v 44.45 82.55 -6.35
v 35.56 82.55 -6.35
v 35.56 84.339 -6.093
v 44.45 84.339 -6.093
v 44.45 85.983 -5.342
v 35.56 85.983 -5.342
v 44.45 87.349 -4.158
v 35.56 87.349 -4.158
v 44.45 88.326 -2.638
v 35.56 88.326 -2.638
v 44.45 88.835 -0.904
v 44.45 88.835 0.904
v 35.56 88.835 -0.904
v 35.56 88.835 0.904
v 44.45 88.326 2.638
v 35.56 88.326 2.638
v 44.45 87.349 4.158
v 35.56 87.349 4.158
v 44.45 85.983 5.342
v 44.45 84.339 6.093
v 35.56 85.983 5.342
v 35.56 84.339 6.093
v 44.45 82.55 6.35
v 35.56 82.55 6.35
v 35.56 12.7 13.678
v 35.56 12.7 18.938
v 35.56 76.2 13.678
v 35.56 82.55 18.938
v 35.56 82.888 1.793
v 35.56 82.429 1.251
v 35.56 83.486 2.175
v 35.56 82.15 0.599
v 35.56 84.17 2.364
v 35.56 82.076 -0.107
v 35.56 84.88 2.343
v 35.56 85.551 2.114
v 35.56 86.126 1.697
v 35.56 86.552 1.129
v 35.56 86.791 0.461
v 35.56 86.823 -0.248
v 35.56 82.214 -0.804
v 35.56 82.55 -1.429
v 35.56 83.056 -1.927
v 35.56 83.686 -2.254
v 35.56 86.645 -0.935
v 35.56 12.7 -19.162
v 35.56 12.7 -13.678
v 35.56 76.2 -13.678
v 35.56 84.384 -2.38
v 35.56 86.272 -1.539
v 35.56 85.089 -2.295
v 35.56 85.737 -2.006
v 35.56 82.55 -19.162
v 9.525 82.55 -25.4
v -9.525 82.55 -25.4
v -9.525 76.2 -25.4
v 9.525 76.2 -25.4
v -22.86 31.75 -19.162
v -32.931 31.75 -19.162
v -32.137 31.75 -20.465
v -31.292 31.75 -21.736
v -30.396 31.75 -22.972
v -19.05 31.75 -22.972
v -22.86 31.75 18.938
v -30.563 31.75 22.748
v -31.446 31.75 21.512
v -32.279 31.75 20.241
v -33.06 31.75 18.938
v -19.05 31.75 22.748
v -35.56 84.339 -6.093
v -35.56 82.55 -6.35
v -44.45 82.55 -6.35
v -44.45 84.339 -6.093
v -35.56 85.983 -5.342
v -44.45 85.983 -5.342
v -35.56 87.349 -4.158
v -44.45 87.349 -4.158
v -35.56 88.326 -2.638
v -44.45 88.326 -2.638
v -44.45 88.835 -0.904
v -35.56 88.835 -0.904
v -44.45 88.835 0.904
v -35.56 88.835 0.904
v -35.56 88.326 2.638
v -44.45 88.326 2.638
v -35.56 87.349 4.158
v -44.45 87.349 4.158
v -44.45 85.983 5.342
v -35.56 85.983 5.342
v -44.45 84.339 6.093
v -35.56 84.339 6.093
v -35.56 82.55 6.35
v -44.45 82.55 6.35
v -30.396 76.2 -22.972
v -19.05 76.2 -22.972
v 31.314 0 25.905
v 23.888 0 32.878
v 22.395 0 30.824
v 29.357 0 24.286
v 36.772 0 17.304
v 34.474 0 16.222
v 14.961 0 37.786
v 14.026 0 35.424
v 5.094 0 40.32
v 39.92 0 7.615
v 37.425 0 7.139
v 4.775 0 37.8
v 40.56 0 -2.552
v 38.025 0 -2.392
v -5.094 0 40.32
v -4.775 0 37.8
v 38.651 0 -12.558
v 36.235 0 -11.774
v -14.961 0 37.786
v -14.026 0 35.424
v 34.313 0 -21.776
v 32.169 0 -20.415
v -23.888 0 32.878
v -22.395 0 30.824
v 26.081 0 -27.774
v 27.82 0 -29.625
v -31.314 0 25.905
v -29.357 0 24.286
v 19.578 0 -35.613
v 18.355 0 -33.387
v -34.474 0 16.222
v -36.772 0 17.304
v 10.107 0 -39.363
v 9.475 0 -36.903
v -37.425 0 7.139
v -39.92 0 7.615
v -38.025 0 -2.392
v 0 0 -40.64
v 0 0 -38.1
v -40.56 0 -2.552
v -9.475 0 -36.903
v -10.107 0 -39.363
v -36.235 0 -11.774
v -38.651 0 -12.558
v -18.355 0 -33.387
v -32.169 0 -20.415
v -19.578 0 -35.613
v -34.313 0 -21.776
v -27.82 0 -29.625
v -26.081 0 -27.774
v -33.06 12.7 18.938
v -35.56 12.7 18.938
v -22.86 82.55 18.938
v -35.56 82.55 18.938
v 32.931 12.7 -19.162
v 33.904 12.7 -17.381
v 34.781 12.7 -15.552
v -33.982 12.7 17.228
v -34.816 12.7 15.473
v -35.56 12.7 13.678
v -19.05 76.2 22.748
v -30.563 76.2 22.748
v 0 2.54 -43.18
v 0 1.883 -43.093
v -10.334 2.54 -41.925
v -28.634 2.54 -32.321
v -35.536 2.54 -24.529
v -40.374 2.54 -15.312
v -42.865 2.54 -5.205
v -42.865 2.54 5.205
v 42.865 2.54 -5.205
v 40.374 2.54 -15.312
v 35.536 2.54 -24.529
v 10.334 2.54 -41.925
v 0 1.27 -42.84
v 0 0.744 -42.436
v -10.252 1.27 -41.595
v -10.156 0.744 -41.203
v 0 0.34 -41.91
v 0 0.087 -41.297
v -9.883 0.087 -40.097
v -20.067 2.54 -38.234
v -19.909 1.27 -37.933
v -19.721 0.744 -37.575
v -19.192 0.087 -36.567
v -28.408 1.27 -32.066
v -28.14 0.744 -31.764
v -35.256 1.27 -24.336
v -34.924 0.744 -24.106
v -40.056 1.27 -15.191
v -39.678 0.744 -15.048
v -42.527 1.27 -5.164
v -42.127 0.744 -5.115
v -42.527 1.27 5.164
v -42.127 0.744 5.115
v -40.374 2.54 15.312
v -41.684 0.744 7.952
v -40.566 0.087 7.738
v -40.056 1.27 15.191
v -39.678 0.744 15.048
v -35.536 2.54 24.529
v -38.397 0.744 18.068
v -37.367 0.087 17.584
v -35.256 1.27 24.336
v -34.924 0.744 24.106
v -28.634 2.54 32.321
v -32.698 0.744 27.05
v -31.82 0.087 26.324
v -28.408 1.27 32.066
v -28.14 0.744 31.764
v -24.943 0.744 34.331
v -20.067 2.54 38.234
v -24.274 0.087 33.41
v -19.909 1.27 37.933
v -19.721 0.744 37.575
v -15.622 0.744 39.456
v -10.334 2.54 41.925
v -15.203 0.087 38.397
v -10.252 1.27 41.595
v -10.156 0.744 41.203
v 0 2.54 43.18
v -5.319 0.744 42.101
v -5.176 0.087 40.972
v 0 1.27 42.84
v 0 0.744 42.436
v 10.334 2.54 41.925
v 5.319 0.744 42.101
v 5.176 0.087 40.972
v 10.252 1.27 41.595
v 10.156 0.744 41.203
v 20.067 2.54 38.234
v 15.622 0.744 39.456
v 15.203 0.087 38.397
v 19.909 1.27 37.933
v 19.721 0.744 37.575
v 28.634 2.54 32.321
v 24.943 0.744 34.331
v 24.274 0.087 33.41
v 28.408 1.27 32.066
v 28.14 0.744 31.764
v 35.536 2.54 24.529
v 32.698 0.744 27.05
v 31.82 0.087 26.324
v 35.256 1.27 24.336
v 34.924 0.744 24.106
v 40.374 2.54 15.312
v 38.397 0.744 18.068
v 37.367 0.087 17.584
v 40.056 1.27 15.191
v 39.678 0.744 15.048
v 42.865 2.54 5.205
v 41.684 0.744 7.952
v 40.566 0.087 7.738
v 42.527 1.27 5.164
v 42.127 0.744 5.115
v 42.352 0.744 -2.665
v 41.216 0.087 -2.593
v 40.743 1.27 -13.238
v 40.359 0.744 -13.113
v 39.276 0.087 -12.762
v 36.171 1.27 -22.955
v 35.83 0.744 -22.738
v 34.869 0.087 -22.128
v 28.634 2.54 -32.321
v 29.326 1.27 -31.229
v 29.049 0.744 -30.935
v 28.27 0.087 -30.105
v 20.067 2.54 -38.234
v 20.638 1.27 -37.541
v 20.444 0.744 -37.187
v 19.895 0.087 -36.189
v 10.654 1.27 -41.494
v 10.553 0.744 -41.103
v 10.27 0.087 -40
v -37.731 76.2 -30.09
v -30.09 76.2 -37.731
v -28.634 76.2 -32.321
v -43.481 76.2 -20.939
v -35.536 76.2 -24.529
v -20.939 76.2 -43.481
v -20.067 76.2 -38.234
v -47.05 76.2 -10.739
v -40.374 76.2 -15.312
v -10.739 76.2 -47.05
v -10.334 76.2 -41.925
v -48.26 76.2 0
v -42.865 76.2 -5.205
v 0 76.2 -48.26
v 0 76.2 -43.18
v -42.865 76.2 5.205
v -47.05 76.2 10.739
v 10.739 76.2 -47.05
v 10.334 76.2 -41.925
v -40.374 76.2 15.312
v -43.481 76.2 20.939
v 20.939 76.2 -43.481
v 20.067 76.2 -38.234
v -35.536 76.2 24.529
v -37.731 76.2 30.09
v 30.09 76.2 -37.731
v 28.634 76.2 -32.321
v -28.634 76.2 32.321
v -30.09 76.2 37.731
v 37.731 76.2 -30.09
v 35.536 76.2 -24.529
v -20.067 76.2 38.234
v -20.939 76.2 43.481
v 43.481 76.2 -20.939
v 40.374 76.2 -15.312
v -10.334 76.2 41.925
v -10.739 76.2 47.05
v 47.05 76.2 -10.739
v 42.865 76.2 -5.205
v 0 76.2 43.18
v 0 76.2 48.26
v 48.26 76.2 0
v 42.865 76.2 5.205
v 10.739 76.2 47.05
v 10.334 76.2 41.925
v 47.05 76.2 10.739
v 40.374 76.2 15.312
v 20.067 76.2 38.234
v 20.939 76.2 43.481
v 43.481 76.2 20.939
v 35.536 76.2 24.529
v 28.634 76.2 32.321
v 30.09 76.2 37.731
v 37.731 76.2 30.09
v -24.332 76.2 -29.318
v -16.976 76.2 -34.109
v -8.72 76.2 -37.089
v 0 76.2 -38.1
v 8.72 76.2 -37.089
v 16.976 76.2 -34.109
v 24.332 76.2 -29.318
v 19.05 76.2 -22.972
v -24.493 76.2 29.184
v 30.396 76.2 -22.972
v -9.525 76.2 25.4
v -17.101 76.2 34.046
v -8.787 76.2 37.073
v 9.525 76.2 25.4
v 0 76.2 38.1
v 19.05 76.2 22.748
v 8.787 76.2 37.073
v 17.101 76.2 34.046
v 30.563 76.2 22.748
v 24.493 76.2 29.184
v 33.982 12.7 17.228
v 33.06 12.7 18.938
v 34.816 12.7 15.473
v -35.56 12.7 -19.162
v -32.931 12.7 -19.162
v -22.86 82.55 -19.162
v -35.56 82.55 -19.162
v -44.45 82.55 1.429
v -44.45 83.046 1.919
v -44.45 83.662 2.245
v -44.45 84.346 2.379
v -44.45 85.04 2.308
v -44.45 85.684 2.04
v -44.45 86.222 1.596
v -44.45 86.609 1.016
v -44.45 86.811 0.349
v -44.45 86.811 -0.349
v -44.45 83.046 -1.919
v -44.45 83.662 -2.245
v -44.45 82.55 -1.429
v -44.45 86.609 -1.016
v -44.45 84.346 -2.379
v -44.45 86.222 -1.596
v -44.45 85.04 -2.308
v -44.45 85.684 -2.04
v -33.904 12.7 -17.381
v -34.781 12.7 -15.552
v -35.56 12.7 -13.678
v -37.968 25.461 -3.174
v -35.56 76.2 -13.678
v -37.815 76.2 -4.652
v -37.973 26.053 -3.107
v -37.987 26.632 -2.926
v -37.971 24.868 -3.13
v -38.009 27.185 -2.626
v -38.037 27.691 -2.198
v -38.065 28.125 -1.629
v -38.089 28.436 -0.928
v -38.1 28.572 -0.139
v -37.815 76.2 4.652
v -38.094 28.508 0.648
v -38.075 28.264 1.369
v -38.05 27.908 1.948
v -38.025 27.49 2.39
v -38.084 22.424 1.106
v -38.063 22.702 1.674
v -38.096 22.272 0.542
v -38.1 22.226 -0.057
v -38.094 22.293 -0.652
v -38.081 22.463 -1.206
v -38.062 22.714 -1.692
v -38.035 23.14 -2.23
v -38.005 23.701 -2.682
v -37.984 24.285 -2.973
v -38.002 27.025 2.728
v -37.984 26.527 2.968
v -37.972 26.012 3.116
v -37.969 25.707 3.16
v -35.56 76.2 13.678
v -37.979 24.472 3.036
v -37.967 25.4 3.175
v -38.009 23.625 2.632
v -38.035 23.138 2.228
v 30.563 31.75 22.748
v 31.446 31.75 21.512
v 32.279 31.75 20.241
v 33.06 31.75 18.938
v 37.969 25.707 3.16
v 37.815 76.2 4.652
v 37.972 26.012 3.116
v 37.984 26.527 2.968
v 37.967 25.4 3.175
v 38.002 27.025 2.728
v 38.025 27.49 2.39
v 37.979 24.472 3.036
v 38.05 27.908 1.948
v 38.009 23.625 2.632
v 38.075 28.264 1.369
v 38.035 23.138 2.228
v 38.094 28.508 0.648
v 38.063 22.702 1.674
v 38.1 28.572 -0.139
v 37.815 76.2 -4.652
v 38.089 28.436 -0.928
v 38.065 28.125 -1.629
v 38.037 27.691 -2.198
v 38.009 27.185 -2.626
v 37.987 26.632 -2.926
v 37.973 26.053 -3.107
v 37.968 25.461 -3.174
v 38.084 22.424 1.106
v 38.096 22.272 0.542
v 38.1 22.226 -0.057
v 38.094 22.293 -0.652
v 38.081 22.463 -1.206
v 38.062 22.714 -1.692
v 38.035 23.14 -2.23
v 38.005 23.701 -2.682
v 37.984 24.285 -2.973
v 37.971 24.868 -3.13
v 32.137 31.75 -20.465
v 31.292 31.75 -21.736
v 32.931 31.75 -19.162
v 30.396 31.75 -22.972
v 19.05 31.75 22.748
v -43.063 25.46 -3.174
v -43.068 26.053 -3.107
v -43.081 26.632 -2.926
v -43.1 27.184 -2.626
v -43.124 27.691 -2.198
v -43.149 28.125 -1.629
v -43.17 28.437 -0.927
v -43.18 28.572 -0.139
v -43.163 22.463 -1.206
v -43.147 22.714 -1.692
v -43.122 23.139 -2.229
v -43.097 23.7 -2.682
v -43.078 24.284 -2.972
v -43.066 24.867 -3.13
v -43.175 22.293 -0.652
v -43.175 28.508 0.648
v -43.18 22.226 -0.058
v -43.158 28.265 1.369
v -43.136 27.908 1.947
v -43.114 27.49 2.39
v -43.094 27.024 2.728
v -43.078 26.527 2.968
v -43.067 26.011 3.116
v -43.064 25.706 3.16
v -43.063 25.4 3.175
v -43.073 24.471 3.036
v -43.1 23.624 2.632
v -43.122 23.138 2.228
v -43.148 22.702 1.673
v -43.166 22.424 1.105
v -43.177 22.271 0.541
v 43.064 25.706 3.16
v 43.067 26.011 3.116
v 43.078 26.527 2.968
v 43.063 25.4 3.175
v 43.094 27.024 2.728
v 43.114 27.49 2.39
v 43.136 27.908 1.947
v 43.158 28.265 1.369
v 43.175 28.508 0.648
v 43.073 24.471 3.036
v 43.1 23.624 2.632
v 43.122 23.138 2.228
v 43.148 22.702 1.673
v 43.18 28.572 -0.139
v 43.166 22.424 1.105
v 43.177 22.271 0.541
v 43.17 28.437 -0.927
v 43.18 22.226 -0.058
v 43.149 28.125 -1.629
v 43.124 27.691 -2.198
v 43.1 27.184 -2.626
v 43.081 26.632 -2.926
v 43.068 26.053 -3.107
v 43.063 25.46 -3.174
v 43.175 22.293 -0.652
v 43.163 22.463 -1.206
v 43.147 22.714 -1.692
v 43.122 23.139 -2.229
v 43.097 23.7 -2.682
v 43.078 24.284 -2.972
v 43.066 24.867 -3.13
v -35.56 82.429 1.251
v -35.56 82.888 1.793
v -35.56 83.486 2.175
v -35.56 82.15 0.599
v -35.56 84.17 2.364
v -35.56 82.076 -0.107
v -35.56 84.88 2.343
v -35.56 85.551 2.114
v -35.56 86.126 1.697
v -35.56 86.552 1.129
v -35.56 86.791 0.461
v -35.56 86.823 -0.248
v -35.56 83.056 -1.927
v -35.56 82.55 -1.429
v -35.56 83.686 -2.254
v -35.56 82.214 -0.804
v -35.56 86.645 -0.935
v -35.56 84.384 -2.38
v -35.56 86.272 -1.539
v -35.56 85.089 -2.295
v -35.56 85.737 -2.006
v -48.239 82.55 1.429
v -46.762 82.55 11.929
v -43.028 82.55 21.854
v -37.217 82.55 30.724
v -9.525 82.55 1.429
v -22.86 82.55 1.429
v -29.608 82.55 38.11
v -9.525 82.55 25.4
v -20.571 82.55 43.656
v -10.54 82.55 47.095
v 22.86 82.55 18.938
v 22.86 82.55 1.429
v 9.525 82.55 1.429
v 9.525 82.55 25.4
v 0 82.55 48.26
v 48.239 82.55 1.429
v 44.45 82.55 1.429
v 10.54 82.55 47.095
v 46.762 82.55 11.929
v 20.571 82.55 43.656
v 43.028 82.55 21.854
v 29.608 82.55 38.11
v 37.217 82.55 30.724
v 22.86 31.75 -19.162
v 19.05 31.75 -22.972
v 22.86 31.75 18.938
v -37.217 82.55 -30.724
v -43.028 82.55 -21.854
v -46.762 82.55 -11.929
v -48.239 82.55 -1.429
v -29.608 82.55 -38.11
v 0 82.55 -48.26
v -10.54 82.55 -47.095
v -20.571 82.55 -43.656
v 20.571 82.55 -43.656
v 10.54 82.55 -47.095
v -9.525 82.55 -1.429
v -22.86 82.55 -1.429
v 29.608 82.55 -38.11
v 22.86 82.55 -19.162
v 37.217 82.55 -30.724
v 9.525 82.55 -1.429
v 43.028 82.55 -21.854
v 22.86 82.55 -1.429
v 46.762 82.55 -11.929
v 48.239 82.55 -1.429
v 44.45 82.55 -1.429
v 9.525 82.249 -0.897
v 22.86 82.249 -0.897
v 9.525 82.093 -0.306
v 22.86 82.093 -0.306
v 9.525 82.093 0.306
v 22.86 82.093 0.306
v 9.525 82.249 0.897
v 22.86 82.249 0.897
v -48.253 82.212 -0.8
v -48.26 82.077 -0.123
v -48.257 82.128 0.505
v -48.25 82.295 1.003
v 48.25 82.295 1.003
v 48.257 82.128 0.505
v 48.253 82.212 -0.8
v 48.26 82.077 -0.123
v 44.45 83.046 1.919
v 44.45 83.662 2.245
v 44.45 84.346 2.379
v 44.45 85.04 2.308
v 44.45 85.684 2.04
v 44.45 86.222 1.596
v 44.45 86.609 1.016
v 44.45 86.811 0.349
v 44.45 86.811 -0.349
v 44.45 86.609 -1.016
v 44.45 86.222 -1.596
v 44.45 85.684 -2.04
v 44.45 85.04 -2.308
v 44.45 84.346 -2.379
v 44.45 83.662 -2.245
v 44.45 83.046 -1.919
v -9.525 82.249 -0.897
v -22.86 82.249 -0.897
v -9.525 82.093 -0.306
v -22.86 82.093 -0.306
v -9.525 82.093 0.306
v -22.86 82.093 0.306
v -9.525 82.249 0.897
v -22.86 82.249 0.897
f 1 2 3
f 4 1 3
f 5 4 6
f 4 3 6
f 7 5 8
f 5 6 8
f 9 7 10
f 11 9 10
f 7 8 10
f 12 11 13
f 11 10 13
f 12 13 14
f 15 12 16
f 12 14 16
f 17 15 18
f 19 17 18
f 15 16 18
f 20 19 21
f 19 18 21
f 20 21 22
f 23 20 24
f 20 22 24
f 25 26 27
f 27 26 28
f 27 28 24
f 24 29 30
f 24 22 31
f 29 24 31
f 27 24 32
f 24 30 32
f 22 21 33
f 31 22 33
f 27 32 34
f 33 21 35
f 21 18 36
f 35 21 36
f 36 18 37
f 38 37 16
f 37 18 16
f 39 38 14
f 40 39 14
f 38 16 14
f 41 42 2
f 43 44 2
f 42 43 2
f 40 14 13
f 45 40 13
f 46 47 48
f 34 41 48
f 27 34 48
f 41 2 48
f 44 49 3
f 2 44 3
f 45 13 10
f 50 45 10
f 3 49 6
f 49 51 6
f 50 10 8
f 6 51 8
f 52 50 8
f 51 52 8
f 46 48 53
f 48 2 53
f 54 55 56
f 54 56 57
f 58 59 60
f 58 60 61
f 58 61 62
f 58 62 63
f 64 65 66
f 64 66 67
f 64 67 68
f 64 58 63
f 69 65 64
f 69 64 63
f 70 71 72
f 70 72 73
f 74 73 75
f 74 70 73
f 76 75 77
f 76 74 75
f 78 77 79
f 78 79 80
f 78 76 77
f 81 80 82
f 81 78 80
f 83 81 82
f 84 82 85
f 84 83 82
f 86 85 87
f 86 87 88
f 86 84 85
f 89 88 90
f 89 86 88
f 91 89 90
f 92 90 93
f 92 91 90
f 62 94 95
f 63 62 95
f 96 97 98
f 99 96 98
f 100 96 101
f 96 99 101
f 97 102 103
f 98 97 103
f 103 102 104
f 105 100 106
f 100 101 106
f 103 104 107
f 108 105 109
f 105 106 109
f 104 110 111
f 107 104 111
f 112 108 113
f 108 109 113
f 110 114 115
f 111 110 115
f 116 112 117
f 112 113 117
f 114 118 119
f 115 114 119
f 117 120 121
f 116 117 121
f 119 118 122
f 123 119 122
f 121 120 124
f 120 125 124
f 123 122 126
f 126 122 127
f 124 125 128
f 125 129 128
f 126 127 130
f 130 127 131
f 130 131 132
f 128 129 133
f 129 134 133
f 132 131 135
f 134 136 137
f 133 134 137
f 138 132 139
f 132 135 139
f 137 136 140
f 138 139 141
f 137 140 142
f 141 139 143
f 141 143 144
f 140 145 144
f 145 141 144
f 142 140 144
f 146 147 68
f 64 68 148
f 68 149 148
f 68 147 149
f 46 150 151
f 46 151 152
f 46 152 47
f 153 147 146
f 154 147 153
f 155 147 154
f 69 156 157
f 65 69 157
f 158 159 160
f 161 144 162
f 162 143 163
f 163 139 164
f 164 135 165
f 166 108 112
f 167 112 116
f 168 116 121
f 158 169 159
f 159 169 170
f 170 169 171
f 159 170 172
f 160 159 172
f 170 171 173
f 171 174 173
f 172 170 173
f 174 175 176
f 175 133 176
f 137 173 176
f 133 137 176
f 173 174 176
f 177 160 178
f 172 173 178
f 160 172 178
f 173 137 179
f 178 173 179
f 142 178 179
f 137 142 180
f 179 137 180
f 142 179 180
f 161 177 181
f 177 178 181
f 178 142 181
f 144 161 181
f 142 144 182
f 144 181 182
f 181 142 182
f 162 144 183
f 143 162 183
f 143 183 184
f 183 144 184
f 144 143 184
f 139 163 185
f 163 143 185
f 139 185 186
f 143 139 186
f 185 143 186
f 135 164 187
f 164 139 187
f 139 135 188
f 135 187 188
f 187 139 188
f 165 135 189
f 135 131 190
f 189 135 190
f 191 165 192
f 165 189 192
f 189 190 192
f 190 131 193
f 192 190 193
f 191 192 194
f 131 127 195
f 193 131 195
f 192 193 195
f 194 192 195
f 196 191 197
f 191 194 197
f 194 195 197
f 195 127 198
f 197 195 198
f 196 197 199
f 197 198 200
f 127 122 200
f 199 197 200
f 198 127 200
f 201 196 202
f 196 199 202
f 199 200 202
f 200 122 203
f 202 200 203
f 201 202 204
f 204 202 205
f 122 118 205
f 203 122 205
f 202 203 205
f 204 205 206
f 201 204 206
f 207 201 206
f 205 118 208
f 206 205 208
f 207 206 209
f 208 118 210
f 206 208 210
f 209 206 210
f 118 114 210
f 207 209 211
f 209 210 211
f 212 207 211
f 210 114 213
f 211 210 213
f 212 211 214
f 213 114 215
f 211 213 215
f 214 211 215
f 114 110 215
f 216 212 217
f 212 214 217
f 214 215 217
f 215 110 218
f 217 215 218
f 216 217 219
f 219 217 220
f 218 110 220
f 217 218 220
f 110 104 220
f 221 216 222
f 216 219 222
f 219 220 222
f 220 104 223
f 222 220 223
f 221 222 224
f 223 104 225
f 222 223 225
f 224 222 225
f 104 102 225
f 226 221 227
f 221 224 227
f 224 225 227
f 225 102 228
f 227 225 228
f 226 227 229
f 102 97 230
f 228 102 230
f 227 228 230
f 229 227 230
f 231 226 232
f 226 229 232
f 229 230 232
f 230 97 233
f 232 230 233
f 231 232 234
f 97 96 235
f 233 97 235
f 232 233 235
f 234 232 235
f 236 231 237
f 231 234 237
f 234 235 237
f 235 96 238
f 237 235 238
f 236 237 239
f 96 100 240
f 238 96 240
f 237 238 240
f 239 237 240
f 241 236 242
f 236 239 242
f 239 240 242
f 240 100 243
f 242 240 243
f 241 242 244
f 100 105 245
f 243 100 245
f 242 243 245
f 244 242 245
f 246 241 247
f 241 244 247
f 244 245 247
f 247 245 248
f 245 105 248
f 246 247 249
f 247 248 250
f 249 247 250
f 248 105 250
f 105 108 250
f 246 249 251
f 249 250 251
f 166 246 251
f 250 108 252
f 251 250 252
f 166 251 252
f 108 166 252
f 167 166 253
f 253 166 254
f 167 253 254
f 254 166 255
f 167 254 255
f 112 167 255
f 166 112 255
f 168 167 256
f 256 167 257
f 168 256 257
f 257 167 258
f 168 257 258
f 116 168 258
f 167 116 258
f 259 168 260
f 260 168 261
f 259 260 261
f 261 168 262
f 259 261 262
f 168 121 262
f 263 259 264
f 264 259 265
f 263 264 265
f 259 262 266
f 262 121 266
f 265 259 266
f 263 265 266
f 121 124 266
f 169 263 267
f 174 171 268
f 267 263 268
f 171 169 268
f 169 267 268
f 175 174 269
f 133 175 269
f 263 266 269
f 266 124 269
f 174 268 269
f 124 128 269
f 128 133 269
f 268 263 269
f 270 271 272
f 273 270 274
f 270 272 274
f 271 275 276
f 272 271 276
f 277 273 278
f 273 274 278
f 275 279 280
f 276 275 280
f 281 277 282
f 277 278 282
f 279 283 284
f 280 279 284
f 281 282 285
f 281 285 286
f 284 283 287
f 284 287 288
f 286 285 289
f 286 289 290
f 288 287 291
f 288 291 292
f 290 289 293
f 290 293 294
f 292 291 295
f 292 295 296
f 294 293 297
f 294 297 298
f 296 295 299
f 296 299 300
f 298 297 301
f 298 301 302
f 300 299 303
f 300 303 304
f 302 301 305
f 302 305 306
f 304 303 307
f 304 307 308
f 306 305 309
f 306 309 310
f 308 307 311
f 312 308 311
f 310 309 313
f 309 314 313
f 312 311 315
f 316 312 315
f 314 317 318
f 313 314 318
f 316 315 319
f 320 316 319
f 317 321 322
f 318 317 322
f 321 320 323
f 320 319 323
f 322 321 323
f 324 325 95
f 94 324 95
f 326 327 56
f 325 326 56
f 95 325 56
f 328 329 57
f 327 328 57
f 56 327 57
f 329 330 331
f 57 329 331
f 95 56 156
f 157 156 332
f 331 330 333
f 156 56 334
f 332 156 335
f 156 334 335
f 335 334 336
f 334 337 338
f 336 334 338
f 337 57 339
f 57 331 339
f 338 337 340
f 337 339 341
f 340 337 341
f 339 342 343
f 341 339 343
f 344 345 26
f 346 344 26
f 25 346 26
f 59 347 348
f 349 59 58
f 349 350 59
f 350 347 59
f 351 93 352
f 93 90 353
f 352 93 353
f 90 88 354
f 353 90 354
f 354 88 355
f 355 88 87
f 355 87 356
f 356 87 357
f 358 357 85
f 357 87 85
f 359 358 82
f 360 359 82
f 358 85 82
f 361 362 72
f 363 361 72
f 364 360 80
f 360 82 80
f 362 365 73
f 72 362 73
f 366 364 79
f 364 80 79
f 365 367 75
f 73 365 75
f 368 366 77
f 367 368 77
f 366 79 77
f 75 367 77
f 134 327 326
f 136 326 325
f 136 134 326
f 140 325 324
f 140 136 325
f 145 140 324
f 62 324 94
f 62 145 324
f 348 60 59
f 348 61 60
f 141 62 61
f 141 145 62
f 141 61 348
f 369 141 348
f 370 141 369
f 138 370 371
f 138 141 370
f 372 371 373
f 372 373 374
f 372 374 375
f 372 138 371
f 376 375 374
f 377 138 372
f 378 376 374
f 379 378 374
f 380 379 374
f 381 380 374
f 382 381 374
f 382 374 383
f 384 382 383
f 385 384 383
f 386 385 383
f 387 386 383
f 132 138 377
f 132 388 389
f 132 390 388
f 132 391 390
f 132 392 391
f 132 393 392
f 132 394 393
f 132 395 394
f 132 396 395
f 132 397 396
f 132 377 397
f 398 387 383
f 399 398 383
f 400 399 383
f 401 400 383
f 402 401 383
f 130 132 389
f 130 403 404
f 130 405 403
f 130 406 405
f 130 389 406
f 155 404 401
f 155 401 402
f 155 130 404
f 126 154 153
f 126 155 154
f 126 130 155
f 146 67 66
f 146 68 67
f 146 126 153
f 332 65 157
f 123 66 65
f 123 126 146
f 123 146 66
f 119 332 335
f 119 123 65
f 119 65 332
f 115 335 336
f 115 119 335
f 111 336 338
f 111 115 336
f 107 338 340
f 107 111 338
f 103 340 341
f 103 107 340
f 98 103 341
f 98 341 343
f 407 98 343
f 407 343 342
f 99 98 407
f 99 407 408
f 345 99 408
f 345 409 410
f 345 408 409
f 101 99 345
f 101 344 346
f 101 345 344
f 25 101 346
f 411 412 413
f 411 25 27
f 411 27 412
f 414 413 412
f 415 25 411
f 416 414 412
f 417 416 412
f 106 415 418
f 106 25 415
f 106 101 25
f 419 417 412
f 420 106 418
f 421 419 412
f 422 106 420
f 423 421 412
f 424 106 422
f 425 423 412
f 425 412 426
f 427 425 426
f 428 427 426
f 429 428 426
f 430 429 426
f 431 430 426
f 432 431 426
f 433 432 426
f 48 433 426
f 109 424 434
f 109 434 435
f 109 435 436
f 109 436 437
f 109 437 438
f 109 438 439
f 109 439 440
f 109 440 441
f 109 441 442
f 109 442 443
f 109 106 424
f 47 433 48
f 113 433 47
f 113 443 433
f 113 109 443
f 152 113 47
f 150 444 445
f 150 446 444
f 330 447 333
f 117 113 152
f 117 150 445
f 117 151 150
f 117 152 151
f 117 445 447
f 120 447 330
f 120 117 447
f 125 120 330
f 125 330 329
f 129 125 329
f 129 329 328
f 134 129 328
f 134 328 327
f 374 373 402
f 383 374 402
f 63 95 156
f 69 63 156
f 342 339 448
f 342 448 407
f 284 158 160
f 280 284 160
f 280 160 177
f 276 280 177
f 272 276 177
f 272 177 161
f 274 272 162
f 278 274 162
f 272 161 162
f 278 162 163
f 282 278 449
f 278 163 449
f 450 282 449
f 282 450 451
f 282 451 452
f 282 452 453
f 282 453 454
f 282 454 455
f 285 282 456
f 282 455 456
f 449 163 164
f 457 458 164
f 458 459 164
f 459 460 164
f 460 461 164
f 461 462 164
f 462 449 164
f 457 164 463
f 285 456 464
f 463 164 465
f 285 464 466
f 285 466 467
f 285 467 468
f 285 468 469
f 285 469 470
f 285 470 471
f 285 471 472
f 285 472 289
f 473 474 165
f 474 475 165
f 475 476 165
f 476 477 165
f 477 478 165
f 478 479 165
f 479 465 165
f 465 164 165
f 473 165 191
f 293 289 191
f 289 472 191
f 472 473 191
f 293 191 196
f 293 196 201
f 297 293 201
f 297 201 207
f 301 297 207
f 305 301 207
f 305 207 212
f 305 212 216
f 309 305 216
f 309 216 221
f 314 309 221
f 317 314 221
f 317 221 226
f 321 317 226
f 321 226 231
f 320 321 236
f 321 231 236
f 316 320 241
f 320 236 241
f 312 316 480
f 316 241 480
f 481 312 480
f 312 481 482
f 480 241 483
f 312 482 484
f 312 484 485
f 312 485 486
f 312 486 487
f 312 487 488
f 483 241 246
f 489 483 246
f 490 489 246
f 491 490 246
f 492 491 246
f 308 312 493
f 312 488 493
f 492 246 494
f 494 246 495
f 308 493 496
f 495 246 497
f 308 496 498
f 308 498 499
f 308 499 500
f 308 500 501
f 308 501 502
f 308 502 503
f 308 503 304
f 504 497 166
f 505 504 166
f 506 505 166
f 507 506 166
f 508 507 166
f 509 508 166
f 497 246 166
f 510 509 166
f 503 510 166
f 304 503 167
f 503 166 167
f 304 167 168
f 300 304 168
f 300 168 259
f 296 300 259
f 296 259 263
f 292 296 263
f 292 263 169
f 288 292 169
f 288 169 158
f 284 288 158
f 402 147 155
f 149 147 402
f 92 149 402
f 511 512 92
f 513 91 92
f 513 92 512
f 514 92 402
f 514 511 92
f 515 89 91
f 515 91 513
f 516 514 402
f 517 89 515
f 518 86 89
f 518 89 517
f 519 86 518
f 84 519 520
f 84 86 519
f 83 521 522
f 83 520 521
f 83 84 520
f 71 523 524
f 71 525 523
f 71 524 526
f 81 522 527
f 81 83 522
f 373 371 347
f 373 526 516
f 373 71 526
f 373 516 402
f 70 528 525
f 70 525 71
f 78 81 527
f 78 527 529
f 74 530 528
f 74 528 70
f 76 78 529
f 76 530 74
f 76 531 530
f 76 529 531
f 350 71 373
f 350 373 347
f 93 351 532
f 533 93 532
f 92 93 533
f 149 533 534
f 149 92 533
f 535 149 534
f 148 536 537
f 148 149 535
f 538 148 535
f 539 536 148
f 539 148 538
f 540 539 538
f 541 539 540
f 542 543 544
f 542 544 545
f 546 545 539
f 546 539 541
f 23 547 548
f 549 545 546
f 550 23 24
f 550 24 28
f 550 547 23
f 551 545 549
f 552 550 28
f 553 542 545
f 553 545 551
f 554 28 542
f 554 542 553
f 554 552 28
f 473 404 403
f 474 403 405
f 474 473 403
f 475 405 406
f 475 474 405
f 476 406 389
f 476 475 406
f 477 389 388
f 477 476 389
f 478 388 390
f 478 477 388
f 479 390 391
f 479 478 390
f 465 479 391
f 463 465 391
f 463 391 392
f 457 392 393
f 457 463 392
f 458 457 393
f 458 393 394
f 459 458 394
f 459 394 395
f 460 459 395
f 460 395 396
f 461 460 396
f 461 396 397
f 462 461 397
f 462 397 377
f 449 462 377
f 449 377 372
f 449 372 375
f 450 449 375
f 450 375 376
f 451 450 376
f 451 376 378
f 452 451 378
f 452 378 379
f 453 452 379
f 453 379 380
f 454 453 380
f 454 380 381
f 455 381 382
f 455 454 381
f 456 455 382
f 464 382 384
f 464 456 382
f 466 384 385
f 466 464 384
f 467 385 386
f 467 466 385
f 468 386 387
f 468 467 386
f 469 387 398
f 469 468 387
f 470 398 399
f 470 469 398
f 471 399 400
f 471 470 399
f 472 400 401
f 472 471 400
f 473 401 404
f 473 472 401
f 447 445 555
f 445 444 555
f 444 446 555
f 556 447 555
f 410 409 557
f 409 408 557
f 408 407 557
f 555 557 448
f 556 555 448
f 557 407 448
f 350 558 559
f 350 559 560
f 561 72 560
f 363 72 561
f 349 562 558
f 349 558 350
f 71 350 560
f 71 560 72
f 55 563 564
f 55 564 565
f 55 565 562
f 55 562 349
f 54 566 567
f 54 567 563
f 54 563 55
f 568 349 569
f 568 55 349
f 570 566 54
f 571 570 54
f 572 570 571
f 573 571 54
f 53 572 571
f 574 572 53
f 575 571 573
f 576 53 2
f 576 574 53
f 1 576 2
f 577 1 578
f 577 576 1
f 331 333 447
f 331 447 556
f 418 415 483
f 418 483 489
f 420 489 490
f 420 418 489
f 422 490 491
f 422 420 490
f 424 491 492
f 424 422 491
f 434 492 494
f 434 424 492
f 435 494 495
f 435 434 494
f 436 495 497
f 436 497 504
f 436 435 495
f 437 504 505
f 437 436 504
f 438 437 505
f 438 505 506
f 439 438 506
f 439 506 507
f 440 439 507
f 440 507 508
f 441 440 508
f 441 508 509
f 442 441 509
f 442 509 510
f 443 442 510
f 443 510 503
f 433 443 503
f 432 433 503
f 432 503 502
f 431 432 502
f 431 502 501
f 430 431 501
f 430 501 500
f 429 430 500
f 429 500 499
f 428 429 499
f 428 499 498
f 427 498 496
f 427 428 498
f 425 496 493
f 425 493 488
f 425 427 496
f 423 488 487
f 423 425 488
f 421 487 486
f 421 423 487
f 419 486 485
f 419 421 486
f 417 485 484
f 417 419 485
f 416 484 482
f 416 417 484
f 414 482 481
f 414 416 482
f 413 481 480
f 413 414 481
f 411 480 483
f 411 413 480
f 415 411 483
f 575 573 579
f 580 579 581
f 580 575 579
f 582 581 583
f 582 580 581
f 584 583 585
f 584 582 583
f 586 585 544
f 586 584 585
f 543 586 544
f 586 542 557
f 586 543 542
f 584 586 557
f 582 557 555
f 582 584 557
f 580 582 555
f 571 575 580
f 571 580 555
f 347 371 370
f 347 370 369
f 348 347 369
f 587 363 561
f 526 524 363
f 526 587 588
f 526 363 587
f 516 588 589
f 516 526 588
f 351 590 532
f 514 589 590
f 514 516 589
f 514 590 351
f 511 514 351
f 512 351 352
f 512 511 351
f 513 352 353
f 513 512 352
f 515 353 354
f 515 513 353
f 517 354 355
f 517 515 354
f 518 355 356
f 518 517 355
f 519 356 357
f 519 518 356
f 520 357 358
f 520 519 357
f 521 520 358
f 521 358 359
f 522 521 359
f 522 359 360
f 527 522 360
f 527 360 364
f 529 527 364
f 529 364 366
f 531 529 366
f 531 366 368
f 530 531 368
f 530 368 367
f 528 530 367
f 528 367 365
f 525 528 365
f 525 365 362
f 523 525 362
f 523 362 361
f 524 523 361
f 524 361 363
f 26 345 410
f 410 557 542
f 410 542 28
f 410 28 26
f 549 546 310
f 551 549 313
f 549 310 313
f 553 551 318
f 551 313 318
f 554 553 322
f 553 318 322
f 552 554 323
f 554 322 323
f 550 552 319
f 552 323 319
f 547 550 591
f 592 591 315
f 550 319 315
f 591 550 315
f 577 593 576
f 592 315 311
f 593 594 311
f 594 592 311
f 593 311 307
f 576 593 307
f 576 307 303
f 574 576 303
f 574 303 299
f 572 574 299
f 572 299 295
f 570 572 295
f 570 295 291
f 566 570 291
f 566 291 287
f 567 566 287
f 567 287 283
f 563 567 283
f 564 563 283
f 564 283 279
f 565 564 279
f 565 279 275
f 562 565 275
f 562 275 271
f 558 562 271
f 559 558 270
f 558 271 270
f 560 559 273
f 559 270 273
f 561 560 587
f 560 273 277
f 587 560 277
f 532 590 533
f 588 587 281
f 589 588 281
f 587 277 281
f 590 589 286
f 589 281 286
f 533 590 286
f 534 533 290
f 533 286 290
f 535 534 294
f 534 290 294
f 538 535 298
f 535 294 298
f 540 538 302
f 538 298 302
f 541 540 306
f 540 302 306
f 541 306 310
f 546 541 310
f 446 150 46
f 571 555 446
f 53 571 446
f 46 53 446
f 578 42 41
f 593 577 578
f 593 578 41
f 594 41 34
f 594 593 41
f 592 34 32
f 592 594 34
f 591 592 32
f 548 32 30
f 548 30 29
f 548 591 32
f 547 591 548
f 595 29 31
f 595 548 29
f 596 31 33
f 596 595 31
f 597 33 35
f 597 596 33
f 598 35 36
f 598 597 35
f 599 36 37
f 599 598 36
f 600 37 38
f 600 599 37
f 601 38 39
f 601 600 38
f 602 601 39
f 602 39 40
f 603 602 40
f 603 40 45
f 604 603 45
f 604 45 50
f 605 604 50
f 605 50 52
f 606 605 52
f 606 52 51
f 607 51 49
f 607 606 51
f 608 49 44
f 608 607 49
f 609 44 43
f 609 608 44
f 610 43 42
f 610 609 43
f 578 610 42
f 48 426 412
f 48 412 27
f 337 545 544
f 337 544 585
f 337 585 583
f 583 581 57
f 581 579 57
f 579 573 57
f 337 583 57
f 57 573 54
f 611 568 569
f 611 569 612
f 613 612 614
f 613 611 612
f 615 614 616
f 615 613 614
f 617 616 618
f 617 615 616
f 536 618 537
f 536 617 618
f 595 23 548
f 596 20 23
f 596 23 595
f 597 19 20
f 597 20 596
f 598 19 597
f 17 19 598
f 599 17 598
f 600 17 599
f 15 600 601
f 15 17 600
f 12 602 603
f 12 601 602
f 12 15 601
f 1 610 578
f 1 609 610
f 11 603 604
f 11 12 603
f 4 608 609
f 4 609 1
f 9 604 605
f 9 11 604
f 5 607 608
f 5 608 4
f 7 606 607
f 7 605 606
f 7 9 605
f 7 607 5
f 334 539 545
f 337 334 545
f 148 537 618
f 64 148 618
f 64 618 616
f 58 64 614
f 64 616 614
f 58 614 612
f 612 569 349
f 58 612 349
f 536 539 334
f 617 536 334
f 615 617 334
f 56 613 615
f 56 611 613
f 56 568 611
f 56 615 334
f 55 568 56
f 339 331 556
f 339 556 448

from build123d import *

# Parameters (mm, degrees)
SKETCH1_R               = 43.18
SKETCH1_R_2             = 38.1
BOSS_EXTRUDE1_DEPTH     = 76.2
SKETCH4_R               = 48.26
BOSS_EXTRUDE2_DEPTH     = 6.35
SKETCH5_W               = 19.05
SKETCH5_H               = 50.8
CUT_EXTRUDE2_DEPTH      = 6.35
BOSS_EXTRUDE3_DEPTH     = 8.89
CUT_EXTRUDE3_START      = -12.7
SKETCH7_R               = 2.38125
CUT_EXTRUDE3_DEPTH      = 99.06
CUT_EXTRUDE4_DEPTH      = 48.26
CUT_EXTRUDE4_DEPTH_BACK = 48.26
SKETCH8_R               = 3.175
FILLET2_R               = 2.54
SKETCH11_W              = 12.7
SKETCH11_H              = 38.1
CUT_EXTRUDE5_DEPTH      = 69.85
BOSS_EXTRUDE4_DEPTH     = 44.45


with BuildPart() as part:
    # Sketch1 → Boss-Extrude1 (new body)
    with BuildSketch(Plane(origin=(0, 0, 0), x_dir=(1, 0, 0), z_dir=(0, 1, 0))):
        with Locations(Location((0, 0, 0), (0, 0, 90))):
            Circle(SKETCH1_R)
        with Locations(Location((0, 0, 0), (0, 0, 90))):
            Circle(SKETCH1_R_2, mode=Mode.SUBTRACT)
    extrude(amount=BOSS_EXTRUDE1_DEPTH)

    # Sketch4 → Boss-Extrude2 (add)
    with BuildSketch(Plane(origin=(0, 76.2, 0), x_dir=(1, 0, 0), z_dir=(0, 1, 0))):
        with Locations(Location((0, 0, 0), (0, 0, 270))):
            Circle(SKETCH4_R)
    extrude(amount=BOSS_EXTRUDE2_DEPTH)

    # Sketch5 → Cut-Extrude2 (cut)
    with BuildSketch(Plane(origin=(0, 82.55, 0), x_dir=(1, 0, 0), z_dir=(0, 1, 0))):
        Rectangle(SKETCH5_W, SKETCH5_H)
    extrude(amount=-CUT_EXTRUDE2_DEPTH, mode=Mode.SUBTRACT)

    # Sketch6 → Boss-Extrude3 (add)
    with BuildSketch(Plane(origin=(35.56, 0, 0), x_dir=(0, 0, -1), z_dir=(1, 0, 0))):
        with BuildLine():
            Line((-6.35, 82.55), (6.35, 82.55))
            ThreePointArc((6.35, 82.55), (0, 88.9), (-6.35, 82.55))
        make_face()
    boss_extrude3 = extrude(amount=BOSS_EXTRUDE3_DEPTH)

    # Sketch7 → Cut-Extrude3 (cut)
    with BuildSketch(Plane.ZY.offset(-35.56).offset(CUT_EXTRUDE3_START)):
        with Locations(Location((0, 84.455, 0), (0, 0, 233.130102354))):
            Circle(SKETCH7_R)
    cut_extrude3 = extrude(amount=CUT_EXTRUDE3_DEPTH, mode=Mode.SUBTRACT)

    # Mirror1: Boss-Extrude3, Cut-Extrude3 across plane
    add(boss_extrude3.mirror(Plane(origin=(0, 0, 0), x_dir=(0, 0, 1), z_dir=(1, 0, 0))))
    add(cut_extrude3.mirror(Plane(origin=(0, 0, 0), x_dir=(0, 0, 1), z_dir=(1, 0, 0))), mode=Mode.SUBTRACT)

    # Sketch8 → Cut-Extrude4 (cut, two sides: drawn at the far end of the back side and taken through both)
    with BuildSketch(Plane(origin=(0, 0, 0), x_dir=(0, 0, -1), z_dir=(1, 0, 0)).offset(-CUT_EXTRUDE4_DEPTH_BACK)):
        with Locations(Location((0, 25.4, 0), (0, 0, 180))):
            Circle(SKETCH8_R)
    extrude(amount=CUT_EXTRUDE4_DEPTH + CUT_EXTRUDE4_DEPTH_BACK, mode=Mode.SUBTRACT)

    # Fillet2
    fillet2_edges = [part.edges().sort_by_distance(p)[0] for p in [
        (0, 0, 43.18),
    ]]
    fillet(fillet2_edges, radius=FILLET2_R)

    # Sketch11 → Cut-Extrude5 (cut)
    with BuildSketch(Plane(origin=(0, 82.55, 0), x_dir=(1, 0, 0), z_dir=(0, 1, 0))):
        with Locations((29.21, 0.11160914)):
            Rectangle(SKETCH11_W, SKETCH11_H)
        with Locations((-29.21, 0.11160914)):
            Rectangle(SKETCH11_W, SKETCH11_H)
    extrude(amount=-CUT_EXTRUDE5_DEPTH, mode=Mode.SUBTRACT)

    # Sketch12 → Boss-Extrude4 (add)
    with BuildSketch(Plane.XZ.offset(-76.2)):
        Polygon((-19.05, 22.74839086), (-31.75, 22.74839086), (-33.059754259, 18.93839086), (-22.86, 18.93839086), (-22.86, -19.16160914), (-32.930878141, -19.16160914), (-31.75, -22.97160914), (-19.05, -22.97160914), align=None)
        Polygon((22.86, 18.93839086), (22.86, -19.16160914), (32.930878141, -19.16160914), (31.75, -22.97160914), (19.05, -22.97160914), (19.05, 22.74839086), (31.75, 22.74839086), (33.059754259, 18.93839086), align=None)
    extrude(amount=BOSS_EXTRUDE4_DEPTH)


solid = part.part
